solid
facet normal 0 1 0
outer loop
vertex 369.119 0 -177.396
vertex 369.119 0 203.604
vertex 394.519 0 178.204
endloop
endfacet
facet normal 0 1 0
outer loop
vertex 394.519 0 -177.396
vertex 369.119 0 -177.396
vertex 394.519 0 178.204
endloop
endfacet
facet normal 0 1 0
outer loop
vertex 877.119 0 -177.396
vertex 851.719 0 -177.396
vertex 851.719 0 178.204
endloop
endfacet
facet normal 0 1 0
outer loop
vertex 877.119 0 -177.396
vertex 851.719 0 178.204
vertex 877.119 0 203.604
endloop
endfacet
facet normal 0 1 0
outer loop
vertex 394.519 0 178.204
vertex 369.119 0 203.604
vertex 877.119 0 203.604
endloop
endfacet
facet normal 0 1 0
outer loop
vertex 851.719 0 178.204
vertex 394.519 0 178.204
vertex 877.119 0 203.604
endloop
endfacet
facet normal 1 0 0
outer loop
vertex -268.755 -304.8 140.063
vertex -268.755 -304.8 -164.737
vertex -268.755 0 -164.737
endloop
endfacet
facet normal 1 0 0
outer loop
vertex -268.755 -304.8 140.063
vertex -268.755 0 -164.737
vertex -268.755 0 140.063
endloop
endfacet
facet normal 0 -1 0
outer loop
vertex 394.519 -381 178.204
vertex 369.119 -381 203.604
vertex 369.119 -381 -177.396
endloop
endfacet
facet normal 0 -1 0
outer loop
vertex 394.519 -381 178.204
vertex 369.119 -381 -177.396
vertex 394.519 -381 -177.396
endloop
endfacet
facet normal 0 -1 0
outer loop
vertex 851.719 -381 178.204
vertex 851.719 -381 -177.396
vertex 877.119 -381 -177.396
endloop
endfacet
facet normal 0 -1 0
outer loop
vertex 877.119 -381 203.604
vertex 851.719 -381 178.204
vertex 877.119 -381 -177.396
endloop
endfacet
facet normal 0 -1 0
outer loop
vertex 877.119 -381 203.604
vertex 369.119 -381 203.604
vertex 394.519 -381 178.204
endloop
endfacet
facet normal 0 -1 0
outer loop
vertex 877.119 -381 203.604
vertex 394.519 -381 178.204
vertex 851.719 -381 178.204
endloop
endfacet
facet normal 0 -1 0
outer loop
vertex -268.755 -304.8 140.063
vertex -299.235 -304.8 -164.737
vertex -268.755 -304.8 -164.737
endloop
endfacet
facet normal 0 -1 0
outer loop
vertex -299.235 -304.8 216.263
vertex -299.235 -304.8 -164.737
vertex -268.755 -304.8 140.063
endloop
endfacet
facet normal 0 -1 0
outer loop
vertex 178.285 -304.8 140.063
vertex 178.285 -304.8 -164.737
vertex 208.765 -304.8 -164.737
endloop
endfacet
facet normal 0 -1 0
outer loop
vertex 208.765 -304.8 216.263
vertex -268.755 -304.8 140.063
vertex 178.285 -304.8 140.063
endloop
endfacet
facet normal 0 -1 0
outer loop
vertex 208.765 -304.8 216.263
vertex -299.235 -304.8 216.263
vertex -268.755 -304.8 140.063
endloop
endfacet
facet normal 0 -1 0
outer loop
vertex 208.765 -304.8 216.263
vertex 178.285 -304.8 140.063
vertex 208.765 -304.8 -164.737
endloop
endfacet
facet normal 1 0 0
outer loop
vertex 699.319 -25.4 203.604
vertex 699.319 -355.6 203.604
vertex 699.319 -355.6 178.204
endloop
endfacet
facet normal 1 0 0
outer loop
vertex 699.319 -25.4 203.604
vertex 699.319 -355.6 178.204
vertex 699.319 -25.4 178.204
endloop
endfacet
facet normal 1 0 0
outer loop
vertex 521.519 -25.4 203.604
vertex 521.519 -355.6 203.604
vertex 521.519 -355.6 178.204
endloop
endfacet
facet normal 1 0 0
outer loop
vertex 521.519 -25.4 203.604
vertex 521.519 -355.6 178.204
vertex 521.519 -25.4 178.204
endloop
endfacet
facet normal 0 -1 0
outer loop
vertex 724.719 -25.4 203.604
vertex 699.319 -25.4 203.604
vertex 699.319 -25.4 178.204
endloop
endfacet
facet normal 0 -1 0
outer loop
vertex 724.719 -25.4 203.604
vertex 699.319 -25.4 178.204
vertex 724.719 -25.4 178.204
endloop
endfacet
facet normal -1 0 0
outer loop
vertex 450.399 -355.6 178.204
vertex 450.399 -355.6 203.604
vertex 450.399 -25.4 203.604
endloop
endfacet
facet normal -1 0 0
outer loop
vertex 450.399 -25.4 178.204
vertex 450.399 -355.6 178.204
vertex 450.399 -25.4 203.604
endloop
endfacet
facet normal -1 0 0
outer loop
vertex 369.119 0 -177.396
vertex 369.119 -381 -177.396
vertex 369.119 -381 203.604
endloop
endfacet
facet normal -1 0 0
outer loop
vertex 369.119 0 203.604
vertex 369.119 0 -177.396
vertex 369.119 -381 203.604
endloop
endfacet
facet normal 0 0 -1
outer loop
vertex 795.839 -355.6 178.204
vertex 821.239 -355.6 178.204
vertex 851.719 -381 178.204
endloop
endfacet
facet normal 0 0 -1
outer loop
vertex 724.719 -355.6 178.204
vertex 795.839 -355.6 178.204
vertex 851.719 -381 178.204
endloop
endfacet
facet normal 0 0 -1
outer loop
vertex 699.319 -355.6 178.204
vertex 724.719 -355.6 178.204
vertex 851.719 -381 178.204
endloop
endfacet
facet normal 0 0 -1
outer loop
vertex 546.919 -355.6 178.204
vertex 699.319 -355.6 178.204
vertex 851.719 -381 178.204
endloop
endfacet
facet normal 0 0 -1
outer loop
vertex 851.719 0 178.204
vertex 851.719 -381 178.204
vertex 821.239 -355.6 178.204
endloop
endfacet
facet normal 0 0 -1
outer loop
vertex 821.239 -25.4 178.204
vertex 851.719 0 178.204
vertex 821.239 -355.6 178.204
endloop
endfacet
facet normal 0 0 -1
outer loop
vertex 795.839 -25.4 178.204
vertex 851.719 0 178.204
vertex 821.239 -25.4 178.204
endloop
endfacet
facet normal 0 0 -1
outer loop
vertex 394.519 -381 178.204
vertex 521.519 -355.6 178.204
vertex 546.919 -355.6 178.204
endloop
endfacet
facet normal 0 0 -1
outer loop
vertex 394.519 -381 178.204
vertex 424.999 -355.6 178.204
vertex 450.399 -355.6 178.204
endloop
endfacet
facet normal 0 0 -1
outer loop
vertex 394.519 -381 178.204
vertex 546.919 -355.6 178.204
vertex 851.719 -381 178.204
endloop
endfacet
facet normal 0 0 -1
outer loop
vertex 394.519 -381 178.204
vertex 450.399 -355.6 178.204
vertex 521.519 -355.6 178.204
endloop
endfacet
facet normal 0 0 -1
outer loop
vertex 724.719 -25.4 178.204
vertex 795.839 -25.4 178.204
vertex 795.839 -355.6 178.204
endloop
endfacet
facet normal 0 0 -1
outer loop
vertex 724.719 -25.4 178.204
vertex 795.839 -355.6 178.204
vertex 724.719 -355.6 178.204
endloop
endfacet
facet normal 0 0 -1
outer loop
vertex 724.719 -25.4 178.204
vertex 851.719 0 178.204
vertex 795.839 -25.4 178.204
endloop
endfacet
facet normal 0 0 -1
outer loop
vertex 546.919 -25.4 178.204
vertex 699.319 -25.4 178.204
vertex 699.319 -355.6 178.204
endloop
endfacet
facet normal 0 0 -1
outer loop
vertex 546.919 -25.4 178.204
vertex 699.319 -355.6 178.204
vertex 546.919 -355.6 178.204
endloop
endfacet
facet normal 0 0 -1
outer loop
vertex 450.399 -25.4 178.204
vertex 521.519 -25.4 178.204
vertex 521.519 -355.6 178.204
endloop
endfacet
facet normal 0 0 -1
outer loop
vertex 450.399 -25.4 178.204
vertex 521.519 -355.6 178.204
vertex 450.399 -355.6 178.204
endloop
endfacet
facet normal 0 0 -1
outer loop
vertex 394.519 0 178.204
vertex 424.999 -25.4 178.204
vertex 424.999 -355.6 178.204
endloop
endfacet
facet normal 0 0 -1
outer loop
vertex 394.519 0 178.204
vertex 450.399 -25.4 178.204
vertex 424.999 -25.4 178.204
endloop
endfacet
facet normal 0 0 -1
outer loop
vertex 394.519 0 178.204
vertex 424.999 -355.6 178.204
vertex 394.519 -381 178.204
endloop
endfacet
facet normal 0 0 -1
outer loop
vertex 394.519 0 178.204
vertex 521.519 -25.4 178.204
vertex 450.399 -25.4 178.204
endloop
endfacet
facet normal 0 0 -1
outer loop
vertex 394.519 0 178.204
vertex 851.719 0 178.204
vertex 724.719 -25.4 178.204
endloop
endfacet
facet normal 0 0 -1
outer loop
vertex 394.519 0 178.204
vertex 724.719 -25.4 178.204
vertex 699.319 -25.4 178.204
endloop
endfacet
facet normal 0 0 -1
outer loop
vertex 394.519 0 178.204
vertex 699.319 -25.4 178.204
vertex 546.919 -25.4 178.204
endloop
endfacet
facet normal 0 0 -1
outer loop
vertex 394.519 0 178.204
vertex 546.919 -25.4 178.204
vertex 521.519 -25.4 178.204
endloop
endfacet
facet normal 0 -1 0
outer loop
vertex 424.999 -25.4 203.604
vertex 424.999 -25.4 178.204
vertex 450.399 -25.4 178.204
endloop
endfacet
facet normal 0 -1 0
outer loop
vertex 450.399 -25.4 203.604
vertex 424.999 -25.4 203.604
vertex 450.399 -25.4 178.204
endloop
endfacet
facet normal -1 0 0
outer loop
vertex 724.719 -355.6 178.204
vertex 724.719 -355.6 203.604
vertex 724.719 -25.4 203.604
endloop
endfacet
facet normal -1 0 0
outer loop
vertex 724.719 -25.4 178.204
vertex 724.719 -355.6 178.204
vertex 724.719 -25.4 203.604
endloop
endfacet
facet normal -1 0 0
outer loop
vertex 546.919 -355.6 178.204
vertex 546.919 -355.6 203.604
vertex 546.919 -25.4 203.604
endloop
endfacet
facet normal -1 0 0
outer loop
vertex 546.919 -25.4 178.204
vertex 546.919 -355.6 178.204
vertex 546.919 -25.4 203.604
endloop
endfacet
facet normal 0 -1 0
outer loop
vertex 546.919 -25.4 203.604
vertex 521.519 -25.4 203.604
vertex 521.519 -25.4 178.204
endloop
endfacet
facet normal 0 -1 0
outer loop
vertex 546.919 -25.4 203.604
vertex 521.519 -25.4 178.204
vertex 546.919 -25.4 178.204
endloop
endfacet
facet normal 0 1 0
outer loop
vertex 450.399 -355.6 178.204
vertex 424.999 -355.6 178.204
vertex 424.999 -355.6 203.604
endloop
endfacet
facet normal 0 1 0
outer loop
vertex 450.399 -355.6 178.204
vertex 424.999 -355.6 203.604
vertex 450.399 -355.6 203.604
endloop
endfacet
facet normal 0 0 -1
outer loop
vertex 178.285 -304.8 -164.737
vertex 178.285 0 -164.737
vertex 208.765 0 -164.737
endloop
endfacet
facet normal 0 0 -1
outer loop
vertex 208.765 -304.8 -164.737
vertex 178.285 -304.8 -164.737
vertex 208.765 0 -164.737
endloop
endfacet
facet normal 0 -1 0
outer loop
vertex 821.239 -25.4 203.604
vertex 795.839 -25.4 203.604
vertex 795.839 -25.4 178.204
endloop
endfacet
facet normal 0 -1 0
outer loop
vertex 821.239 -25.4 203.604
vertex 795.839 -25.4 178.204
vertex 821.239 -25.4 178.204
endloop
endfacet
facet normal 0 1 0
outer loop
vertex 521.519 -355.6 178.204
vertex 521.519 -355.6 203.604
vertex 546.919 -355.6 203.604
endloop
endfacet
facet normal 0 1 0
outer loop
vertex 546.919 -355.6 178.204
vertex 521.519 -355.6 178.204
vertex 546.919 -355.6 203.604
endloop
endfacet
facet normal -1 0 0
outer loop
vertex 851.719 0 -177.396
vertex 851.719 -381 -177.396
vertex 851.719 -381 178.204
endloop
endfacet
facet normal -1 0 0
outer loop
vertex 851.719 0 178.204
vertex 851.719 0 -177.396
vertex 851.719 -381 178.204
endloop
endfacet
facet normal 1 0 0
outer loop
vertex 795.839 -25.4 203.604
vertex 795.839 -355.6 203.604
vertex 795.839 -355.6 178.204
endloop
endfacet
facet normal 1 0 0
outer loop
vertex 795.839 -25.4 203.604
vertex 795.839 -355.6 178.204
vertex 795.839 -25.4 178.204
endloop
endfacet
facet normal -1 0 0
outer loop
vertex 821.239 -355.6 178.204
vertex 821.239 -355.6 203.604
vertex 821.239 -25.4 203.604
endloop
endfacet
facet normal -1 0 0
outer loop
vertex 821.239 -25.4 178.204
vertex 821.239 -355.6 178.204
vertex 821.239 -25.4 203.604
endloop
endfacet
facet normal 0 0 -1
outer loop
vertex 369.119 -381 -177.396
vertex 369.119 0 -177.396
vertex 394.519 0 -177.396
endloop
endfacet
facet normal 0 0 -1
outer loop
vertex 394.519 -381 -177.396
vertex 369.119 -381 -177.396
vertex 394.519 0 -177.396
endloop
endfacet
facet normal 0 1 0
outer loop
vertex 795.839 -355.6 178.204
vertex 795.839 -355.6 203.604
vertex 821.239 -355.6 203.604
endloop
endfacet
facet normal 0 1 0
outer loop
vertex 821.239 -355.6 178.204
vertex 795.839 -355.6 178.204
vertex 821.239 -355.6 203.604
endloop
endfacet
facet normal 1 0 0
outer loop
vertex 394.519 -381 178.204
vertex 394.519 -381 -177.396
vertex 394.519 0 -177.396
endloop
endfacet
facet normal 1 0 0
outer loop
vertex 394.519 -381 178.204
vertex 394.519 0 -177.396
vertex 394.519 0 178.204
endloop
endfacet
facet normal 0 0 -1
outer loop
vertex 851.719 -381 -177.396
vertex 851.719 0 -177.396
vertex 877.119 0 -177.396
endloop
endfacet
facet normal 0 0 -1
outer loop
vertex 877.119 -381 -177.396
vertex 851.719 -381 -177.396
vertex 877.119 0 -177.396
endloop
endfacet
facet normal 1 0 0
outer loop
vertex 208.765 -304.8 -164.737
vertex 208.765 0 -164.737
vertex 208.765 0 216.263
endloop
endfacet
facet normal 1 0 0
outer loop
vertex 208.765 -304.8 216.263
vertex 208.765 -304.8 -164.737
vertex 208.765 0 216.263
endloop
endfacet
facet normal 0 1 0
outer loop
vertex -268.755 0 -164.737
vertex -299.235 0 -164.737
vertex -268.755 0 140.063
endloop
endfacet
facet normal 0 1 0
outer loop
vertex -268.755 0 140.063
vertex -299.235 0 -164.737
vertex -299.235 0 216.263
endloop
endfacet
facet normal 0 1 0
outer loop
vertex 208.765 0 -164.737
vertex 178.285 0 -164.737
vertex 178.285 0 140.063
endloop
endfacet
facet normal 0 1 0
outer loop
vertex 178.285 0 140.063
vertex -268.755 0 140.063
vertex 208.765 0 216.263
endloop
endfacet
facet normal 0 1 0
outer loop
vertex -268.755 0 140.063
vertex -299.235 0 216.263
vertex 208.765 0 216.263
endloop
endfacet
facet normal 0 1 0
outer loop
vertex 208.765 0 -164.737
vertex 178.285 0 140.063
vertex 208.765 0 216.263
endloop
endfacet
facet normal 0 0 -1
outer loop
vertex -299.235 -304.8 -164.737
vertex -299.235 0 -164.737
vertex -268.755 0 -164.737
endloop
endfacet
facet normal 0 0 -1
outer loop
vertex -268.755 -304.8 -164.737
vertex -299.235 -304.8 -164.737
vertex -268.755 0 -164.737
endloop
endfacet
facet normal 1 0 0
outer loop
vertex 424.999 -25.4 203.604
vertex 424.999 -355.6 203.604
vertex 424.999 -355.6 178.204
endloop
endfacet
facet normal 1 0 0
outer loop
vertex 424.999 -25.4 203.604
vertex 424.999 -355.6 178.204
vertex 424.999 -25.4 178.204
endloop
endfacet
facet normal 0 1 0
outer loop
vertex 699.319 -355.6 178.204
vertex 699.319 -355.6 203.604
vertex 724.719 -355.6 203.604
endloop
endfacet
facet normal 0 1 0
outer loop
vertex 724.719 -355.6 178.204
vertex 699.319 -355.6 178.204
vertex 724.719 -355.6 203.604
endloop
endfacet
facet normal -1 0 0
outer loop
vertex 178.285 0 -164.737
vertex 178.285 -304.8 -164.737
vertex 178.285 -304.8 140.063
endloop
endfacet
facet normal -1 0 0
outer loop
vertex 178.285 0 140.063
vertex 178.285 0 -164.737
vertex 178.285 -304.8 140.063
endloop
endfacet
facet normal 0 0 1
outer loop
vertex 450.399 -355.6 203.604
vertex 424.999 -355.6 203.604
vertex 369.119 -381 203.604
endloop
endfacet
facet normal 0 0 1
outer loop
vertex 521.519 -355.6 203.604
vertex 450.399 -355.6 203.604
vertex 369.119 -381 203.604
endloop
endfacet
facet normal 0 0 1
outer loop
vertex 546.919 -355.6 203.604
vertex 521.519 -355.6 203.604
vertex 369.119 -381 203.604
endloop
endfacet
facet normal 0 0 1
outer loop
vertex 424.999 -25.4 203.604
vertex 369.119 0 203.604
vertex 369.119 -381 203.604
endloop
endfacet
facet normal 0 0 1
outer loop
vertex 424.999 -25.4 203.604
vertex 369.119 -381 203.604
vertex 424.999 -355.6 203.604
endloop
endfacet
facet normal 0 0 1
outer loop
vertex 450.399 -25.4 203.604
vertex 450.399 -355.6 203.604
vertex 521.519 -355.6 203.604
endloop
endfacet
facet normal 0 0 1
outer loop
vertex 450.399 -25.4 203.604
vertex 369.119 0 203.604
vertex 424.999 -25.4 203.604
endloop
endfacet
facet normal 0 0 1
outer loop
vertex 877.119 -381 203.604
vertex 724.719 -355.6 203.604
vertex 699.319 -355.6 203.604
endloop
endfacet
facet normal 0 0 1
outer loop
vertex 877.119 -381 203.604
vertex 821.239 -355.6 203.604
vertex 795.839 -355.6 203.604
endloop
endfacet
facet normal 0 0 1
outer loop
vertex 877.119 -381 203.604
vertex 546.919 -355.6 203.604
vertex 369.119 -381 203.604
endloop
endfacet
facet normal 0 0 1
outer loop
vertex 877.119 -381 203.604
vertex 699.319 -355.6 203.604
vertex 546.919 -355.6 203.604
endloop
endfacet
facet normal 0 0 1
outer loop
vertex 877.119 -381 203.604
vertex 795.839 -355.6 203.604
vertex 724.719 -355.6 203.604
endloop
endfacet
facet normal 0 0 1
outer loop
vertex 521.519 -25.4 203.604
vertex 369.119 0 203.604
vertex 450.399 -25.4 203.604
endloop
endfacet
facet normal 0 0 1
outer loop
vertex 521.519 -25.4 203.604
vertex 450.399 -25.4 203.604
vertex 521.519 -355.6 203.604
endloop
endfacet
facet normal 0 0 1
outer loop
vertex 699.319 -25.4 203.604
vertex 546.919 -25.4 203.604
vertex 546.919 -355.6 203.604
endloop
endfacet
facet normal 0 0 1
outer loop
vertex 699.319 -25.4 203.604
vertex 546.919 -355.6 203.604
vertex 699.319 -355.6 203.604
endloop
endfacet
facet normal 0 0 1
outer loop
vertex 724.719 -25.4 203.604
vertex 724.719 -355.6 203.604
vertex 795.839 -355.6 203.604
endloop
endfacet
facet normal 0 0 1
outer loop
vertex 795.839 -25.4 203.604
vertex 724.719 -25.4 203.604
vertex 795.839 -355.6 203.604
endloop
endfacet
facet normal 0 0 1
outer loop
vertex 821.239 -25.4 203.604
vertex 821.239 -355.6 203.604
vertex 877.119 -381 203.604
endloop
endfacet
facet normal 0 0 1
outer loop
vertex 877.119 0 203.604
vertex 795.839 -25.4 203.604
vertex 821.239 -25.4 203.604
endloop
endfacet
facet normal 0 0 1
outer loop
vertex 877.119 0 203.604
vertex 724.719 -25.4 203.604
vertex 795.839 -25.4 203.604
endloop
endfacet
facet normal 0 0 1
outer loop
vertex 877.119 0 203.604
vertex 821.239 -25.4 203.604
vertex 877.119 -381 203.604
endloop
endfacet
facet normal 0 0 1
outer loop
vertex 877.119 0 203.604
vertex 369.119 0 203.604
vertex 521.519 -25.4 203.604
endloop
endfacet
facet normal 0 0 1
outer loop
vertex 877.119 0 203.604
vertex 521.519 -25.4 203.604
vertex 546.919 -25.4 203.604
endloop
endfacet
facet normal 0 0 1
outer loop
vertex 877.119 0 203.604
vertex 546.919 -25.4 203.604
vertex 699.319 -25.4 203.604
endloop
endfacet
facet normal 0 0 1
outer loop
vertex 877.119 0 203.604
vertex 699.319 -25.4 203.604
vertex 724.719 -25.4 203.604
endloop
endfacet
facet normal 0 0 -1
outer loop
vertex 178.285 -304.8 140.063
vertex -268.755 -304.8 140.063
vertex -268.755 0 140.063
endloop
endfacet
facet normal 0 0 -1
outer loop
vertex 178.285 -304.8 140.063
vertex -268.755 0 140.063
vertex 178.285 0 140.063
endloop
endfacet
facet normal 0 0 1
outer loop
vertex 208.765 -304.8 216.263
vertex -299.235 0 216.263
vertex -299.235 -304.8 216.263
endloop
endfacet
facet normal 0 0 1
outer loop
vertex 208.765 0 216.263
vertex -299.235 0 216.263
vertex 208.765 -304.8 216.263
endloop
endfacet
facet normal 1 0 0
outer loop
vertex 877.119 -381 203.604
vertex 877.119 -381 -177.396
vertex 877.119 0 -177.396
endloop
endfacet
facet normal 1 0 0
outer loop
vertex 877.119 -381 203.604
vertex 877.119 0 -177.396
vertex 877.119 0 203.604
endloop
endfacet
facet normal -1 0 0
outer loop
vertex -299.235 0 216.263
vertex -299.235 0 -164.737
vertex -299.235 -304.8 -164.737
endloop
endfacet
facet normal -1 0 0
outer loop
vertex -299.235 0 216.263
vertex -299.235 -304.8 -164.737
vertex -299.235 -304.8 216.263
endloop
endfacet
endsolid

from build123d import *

# Parameters (mm, degrees)
F0_W     = 508
F0_H     = 381
F1_DEPTH = 304.8
F2_W     = 447.04
F2_H     = 304.8
F3_DEPTH = 304.8
F4_W     = 508
F4_H     = 381
F5_DEPTH = 381
F6_W     = 457.2
F6_H     = 355.6
F7_DEPTH = 381
F8_W     = 25.4
F8_H     = 330.2
F9_DEPTH = 25.4


with BuildPart() as f1:
    # F0 (on Front) → F1 (new body)
    with BuildSketch(Plane.XZ):
        with Locations((-45.234757, 25.763125)):
            Rectangle(F0_W, F0_H)
    extrude(amount=F1_DEPTH)

    # F2 (on face) → F3 (cut)
    with BuildSketch(Plane.XZ.offset(304.8)):
        with Locations((-45.234757, -12.336875)):
            Rectangle(F2_W, F2_H)
    extrude(amount=-F3_DEPTH, mode=Mode.SUBTRACT)


with BuildPart() as f5:
    # F4 (on Front) → F5 (new body)
    with BuildSketch(Plane.XZ):
        with Locations((623.118937, 13.103522)):
            Rectangle(F4_W, F4_H)
    extrude(amount=F5_DEPTH)

    # F6 (on face) → F7 (cut)
    with BuildSketch(Plane(origin=(0, 0, 0), x_dir=(-1, 0, 0), z_dir=(0, 1, 0))):
        with Locations((-623.118937, 0.403522)):
            Rectangle(F6_W, F6_H)
    extrude(amount=-F7_DEPTH, mode=Mode.SUBTRACT)

    # F8 (on face) → F9 (cut)
    with BuildSketch(Plane.XY.offset(203.603522)):
        with Locations((437.698937, -190.5)):
            Rectangle(F8_W, F8_H)
        with Locations((534.218937, -190.5)):
            Rectangle(F8_W, F8_H)
        with Locations((712.018937, -190.5)):
            Rectangle(F8_W, F8_H)
        with Locations((808.538937, -190.5)):
            Rectangle(F8_W, F8_H)
    extrude(amount=-F9_DEPTH, mode=Mode.SUBTRACT)


solid = Compound([f1.part, f5.part])
